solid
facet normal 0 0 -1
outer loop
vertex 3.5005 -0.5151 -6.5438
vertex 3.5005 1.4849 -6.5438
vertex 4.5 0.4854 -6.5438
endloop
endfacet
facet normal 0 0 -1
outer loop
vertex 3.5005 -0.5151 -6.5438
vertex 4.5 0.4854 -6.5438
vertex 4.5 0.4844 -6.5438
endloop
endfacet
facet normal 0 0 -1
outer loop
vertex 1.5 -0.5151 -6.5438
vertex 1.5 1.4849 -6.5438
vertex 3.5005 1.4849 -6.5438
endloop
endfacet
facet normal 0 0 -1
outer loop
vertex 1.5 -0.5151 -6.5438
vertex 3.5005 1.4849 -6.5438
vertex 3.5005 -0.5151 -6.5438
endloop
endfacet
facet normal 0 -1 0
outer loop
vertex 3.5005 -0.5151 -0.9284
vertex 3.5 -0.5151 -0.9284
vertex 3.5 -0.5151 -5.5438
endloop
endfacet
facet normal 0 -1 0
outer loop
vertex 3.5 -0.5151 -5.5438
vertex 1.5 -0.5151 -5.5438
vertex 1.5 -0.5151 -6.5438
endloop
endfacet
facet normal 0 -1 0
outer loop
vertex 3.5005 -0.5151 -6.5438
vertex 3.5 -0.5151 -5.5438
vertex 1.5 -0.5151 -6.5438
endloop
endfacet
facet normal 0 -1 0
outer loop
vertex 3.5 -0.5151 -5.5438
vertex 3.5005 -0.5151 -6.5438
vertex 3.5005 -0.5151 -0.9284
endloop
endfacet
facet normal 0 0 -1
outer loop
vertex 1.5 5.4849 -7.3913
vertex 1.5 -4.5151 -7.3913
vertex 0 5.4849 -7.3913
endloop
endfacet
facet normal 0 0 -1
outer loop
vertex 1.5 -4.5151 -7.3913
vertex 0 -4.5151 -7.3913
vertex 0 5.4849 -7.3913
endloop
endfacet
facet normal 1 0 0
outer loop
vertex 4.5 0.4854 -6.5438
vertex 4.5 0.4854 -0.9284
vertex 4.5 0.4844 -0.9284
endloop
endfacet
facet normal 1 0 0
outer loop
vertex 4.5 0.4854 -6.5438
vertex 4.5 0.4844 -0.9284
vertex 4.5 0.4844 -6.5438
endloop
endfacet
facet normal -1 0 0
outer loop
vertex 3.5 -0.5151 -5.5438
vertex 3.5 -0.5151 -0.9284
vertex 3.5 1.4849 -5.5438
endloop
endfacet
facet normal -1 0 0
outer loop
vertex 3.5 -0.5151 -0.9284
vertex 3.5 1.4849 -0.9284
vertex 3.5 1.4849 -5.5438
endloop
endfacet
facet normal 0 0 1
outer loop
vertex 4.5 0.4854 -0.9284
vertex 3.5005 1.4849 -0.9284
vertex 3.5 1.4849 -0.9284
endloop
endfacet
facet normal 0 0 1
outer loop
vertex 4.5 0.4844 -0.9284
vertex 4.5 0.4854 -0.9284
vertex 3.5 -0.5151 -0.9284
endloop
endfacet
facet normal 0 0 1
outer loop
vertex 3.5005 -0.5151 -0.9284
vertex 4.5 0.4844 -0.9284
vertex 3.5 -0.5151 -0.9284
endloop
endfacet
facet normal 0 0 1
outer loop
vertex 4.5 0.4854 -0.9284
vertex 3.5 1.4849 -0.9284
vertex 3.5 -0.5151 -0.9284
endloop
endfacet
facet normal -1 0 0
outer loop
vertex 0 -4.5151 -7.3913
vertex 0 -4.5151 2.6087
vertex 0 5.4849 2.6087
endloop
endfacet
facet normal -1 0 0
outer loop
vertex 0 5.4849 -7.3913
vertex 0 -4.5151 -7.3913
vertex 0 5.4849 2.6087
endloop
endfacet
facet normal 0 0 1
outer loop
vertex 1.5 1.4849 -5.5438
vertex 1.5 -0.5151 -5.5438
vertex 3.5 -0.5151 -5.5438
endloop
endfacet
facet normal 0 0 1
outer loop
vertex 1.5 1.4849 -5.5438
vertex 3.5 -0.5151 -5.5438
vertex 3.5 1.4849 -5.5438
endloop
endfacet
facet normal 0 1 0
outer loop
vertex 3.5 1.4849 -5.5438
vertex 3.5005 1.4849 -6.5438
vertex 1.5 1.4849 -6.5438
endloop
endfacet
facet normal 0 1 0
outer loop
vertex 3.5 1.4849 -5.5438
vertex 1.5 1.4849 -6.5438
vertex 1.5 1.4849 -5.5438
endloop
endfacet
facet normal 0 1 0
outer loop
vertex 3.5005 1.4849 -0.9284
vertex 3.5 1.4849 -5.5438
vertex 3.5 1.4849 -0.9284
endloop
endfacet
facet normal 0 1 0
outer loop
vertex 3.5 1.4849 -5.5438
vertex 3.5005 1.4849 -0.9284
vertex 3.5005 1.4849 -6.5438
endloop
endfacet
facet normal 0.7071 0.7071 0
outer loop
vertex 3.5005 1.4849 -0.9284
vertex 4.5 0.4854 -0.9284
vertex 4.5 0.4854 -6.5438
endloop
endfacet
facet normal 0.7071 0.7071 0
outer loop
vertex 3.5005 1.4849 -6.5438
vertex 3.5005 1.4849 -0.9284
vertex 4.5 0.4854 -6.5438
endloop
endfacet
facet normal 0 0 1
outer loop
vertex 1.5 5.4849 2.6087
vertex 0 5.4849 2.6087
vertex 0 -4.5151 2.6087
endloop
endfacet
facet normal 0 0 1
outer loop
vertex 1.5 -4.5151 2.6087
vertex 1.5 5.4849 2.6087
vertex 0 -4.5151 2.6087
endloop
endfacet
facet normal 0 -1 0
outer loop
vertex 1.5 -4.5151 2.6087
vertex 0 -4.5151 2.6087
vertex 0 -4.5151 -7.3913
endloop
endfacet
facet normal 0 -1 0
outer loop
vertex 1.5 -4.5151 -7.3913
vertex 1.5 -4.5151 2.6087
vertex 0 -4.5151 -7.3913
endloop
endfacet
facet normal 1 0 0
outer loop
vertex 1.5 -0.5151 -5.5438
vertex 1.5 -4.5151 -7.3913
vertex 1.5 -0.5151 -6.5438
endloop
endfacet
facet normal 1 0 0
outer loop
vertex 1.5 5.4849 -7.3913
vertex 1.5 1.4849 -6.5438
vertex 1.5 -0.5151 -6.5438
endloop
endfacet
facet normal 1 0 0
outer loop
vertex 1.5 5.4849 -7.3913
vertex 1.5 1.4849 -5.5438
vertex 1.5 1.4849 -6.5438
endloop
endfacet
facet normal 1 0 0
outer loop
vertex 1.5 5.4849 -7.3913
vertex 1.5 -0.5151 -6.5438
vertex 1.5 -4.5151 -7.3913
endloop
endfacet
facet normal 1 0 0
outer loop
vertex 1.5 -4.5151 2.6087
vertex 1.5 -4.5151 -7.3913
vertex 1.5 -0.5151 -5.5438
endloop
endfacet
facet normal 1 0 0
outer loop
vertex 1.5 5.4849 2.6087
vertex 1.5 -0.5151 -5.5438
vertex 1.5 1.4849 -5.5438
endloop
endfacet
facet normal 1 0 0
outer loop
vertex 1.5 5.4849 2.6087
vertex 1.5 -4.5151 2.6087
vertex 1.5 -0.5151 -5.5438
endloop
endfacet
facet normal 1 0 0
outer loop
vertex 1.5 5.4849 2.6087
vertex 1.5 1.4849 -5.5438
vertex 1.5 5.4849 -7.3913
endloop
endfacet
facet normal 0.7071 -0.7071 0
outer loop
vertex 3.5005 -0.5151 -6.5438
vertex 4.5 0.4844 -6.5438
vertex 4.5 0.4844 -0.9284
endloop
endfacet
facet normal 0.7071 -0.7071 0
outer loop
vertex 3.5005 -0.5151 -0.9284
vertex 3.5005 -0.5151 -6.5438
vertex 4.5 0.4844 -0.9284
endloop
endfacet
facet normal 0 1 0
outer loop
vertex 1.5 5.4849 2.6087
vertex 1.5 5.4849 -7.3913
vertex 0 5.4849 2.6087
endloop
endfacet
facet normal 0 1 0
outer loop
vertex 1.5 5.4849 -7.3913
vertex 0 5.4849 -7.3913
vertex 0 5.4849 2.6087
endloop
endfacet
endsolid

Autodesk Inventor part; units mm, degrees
ref_plane "YZ Plane" through (0, 0, 0) normal (1, 0, 0) x (0, 1, 0)
ref_plane "XZ Plane" through (0, 0, 0) normal (0, 1, 0) x (-1, 0, 0)
ref_plane "XY Plane" through (0, 0, 0) normal (0, 0, 1) x (1, 0, 0)
sketch "Esquisse1" plane through (0, 0, 0) normal (1, 0, 0) x (0, 1, 0)
  line L0 (5.4849, 2.6087) -> (-4.5151, 2.6087)
  line L1 (-4.5151, 2.6087) -> (-4.5151, -7.3913)
  line L2 (-4.5151, -7.3913) -> (5.4849, -7.3913)
  line L3 (5.4849, -7.3913) -> (5.4849, 2.6087)
  point P0 (0, 0)
  dimension "d0" = 10
  dimension "d1" = 10
extrude "Extrusion1" add sketch "Esquisse1" along normal blind 1.5
sketch "Esquisse2" plane through (1.5, 0, 0) normal (1, 0, 0) x (0, 0, -1)
  line L0 (5.5438, 1.4849) -> (6.5438, 1.4849)
  line L1 (6.5438, 1.4849) -> (6.5438, -0.5151)
  line L2 (6.5438, -0.5151) -> (5.5438, -0.5151)
  line L3 (5.5438, -0.5151) -> (5.5438, 1.4849)
  line L4 (7.3913, 5.4849) -> (-2.6087, 5.4849) projected
  point P0 (0, 0)
  dimension "d4" = 1
  dimension "d5" = 2
  dimension "d6" = 4
extrude "Extrusion2" add sketch "Esquisse2" along normal blind 2
sketch "Esquisse3" plane through (3.5, 0, 0) normal (1, 0, 0) x (0, 0, -1)
  line L0 (6.5438, 1.4849) -> (6.5438, -0.5151) projected
  line L1 (6.5438, 1.4849) -> (0.9284, 1.4849)
  line L2 (0.9284, 1.4849) -> (0.9284, -0.5151)
  line L3 (0.9284, -0.5151) -> (6.5438, -0.5151)
  line L4 (6.5438, -0.5151) -> (6.5438, 1.4849)
  point P0 (0, 0)
extrude "Extrusion3" add sketch "Esquisse3" along normal blind 1
chamfer "Chanfrein1" distance 1 angle 45 2 edges at (4.5, 1.4849, -3.7361) (4.5, -0.5151, -3.7361)
properties part number "crochet"
